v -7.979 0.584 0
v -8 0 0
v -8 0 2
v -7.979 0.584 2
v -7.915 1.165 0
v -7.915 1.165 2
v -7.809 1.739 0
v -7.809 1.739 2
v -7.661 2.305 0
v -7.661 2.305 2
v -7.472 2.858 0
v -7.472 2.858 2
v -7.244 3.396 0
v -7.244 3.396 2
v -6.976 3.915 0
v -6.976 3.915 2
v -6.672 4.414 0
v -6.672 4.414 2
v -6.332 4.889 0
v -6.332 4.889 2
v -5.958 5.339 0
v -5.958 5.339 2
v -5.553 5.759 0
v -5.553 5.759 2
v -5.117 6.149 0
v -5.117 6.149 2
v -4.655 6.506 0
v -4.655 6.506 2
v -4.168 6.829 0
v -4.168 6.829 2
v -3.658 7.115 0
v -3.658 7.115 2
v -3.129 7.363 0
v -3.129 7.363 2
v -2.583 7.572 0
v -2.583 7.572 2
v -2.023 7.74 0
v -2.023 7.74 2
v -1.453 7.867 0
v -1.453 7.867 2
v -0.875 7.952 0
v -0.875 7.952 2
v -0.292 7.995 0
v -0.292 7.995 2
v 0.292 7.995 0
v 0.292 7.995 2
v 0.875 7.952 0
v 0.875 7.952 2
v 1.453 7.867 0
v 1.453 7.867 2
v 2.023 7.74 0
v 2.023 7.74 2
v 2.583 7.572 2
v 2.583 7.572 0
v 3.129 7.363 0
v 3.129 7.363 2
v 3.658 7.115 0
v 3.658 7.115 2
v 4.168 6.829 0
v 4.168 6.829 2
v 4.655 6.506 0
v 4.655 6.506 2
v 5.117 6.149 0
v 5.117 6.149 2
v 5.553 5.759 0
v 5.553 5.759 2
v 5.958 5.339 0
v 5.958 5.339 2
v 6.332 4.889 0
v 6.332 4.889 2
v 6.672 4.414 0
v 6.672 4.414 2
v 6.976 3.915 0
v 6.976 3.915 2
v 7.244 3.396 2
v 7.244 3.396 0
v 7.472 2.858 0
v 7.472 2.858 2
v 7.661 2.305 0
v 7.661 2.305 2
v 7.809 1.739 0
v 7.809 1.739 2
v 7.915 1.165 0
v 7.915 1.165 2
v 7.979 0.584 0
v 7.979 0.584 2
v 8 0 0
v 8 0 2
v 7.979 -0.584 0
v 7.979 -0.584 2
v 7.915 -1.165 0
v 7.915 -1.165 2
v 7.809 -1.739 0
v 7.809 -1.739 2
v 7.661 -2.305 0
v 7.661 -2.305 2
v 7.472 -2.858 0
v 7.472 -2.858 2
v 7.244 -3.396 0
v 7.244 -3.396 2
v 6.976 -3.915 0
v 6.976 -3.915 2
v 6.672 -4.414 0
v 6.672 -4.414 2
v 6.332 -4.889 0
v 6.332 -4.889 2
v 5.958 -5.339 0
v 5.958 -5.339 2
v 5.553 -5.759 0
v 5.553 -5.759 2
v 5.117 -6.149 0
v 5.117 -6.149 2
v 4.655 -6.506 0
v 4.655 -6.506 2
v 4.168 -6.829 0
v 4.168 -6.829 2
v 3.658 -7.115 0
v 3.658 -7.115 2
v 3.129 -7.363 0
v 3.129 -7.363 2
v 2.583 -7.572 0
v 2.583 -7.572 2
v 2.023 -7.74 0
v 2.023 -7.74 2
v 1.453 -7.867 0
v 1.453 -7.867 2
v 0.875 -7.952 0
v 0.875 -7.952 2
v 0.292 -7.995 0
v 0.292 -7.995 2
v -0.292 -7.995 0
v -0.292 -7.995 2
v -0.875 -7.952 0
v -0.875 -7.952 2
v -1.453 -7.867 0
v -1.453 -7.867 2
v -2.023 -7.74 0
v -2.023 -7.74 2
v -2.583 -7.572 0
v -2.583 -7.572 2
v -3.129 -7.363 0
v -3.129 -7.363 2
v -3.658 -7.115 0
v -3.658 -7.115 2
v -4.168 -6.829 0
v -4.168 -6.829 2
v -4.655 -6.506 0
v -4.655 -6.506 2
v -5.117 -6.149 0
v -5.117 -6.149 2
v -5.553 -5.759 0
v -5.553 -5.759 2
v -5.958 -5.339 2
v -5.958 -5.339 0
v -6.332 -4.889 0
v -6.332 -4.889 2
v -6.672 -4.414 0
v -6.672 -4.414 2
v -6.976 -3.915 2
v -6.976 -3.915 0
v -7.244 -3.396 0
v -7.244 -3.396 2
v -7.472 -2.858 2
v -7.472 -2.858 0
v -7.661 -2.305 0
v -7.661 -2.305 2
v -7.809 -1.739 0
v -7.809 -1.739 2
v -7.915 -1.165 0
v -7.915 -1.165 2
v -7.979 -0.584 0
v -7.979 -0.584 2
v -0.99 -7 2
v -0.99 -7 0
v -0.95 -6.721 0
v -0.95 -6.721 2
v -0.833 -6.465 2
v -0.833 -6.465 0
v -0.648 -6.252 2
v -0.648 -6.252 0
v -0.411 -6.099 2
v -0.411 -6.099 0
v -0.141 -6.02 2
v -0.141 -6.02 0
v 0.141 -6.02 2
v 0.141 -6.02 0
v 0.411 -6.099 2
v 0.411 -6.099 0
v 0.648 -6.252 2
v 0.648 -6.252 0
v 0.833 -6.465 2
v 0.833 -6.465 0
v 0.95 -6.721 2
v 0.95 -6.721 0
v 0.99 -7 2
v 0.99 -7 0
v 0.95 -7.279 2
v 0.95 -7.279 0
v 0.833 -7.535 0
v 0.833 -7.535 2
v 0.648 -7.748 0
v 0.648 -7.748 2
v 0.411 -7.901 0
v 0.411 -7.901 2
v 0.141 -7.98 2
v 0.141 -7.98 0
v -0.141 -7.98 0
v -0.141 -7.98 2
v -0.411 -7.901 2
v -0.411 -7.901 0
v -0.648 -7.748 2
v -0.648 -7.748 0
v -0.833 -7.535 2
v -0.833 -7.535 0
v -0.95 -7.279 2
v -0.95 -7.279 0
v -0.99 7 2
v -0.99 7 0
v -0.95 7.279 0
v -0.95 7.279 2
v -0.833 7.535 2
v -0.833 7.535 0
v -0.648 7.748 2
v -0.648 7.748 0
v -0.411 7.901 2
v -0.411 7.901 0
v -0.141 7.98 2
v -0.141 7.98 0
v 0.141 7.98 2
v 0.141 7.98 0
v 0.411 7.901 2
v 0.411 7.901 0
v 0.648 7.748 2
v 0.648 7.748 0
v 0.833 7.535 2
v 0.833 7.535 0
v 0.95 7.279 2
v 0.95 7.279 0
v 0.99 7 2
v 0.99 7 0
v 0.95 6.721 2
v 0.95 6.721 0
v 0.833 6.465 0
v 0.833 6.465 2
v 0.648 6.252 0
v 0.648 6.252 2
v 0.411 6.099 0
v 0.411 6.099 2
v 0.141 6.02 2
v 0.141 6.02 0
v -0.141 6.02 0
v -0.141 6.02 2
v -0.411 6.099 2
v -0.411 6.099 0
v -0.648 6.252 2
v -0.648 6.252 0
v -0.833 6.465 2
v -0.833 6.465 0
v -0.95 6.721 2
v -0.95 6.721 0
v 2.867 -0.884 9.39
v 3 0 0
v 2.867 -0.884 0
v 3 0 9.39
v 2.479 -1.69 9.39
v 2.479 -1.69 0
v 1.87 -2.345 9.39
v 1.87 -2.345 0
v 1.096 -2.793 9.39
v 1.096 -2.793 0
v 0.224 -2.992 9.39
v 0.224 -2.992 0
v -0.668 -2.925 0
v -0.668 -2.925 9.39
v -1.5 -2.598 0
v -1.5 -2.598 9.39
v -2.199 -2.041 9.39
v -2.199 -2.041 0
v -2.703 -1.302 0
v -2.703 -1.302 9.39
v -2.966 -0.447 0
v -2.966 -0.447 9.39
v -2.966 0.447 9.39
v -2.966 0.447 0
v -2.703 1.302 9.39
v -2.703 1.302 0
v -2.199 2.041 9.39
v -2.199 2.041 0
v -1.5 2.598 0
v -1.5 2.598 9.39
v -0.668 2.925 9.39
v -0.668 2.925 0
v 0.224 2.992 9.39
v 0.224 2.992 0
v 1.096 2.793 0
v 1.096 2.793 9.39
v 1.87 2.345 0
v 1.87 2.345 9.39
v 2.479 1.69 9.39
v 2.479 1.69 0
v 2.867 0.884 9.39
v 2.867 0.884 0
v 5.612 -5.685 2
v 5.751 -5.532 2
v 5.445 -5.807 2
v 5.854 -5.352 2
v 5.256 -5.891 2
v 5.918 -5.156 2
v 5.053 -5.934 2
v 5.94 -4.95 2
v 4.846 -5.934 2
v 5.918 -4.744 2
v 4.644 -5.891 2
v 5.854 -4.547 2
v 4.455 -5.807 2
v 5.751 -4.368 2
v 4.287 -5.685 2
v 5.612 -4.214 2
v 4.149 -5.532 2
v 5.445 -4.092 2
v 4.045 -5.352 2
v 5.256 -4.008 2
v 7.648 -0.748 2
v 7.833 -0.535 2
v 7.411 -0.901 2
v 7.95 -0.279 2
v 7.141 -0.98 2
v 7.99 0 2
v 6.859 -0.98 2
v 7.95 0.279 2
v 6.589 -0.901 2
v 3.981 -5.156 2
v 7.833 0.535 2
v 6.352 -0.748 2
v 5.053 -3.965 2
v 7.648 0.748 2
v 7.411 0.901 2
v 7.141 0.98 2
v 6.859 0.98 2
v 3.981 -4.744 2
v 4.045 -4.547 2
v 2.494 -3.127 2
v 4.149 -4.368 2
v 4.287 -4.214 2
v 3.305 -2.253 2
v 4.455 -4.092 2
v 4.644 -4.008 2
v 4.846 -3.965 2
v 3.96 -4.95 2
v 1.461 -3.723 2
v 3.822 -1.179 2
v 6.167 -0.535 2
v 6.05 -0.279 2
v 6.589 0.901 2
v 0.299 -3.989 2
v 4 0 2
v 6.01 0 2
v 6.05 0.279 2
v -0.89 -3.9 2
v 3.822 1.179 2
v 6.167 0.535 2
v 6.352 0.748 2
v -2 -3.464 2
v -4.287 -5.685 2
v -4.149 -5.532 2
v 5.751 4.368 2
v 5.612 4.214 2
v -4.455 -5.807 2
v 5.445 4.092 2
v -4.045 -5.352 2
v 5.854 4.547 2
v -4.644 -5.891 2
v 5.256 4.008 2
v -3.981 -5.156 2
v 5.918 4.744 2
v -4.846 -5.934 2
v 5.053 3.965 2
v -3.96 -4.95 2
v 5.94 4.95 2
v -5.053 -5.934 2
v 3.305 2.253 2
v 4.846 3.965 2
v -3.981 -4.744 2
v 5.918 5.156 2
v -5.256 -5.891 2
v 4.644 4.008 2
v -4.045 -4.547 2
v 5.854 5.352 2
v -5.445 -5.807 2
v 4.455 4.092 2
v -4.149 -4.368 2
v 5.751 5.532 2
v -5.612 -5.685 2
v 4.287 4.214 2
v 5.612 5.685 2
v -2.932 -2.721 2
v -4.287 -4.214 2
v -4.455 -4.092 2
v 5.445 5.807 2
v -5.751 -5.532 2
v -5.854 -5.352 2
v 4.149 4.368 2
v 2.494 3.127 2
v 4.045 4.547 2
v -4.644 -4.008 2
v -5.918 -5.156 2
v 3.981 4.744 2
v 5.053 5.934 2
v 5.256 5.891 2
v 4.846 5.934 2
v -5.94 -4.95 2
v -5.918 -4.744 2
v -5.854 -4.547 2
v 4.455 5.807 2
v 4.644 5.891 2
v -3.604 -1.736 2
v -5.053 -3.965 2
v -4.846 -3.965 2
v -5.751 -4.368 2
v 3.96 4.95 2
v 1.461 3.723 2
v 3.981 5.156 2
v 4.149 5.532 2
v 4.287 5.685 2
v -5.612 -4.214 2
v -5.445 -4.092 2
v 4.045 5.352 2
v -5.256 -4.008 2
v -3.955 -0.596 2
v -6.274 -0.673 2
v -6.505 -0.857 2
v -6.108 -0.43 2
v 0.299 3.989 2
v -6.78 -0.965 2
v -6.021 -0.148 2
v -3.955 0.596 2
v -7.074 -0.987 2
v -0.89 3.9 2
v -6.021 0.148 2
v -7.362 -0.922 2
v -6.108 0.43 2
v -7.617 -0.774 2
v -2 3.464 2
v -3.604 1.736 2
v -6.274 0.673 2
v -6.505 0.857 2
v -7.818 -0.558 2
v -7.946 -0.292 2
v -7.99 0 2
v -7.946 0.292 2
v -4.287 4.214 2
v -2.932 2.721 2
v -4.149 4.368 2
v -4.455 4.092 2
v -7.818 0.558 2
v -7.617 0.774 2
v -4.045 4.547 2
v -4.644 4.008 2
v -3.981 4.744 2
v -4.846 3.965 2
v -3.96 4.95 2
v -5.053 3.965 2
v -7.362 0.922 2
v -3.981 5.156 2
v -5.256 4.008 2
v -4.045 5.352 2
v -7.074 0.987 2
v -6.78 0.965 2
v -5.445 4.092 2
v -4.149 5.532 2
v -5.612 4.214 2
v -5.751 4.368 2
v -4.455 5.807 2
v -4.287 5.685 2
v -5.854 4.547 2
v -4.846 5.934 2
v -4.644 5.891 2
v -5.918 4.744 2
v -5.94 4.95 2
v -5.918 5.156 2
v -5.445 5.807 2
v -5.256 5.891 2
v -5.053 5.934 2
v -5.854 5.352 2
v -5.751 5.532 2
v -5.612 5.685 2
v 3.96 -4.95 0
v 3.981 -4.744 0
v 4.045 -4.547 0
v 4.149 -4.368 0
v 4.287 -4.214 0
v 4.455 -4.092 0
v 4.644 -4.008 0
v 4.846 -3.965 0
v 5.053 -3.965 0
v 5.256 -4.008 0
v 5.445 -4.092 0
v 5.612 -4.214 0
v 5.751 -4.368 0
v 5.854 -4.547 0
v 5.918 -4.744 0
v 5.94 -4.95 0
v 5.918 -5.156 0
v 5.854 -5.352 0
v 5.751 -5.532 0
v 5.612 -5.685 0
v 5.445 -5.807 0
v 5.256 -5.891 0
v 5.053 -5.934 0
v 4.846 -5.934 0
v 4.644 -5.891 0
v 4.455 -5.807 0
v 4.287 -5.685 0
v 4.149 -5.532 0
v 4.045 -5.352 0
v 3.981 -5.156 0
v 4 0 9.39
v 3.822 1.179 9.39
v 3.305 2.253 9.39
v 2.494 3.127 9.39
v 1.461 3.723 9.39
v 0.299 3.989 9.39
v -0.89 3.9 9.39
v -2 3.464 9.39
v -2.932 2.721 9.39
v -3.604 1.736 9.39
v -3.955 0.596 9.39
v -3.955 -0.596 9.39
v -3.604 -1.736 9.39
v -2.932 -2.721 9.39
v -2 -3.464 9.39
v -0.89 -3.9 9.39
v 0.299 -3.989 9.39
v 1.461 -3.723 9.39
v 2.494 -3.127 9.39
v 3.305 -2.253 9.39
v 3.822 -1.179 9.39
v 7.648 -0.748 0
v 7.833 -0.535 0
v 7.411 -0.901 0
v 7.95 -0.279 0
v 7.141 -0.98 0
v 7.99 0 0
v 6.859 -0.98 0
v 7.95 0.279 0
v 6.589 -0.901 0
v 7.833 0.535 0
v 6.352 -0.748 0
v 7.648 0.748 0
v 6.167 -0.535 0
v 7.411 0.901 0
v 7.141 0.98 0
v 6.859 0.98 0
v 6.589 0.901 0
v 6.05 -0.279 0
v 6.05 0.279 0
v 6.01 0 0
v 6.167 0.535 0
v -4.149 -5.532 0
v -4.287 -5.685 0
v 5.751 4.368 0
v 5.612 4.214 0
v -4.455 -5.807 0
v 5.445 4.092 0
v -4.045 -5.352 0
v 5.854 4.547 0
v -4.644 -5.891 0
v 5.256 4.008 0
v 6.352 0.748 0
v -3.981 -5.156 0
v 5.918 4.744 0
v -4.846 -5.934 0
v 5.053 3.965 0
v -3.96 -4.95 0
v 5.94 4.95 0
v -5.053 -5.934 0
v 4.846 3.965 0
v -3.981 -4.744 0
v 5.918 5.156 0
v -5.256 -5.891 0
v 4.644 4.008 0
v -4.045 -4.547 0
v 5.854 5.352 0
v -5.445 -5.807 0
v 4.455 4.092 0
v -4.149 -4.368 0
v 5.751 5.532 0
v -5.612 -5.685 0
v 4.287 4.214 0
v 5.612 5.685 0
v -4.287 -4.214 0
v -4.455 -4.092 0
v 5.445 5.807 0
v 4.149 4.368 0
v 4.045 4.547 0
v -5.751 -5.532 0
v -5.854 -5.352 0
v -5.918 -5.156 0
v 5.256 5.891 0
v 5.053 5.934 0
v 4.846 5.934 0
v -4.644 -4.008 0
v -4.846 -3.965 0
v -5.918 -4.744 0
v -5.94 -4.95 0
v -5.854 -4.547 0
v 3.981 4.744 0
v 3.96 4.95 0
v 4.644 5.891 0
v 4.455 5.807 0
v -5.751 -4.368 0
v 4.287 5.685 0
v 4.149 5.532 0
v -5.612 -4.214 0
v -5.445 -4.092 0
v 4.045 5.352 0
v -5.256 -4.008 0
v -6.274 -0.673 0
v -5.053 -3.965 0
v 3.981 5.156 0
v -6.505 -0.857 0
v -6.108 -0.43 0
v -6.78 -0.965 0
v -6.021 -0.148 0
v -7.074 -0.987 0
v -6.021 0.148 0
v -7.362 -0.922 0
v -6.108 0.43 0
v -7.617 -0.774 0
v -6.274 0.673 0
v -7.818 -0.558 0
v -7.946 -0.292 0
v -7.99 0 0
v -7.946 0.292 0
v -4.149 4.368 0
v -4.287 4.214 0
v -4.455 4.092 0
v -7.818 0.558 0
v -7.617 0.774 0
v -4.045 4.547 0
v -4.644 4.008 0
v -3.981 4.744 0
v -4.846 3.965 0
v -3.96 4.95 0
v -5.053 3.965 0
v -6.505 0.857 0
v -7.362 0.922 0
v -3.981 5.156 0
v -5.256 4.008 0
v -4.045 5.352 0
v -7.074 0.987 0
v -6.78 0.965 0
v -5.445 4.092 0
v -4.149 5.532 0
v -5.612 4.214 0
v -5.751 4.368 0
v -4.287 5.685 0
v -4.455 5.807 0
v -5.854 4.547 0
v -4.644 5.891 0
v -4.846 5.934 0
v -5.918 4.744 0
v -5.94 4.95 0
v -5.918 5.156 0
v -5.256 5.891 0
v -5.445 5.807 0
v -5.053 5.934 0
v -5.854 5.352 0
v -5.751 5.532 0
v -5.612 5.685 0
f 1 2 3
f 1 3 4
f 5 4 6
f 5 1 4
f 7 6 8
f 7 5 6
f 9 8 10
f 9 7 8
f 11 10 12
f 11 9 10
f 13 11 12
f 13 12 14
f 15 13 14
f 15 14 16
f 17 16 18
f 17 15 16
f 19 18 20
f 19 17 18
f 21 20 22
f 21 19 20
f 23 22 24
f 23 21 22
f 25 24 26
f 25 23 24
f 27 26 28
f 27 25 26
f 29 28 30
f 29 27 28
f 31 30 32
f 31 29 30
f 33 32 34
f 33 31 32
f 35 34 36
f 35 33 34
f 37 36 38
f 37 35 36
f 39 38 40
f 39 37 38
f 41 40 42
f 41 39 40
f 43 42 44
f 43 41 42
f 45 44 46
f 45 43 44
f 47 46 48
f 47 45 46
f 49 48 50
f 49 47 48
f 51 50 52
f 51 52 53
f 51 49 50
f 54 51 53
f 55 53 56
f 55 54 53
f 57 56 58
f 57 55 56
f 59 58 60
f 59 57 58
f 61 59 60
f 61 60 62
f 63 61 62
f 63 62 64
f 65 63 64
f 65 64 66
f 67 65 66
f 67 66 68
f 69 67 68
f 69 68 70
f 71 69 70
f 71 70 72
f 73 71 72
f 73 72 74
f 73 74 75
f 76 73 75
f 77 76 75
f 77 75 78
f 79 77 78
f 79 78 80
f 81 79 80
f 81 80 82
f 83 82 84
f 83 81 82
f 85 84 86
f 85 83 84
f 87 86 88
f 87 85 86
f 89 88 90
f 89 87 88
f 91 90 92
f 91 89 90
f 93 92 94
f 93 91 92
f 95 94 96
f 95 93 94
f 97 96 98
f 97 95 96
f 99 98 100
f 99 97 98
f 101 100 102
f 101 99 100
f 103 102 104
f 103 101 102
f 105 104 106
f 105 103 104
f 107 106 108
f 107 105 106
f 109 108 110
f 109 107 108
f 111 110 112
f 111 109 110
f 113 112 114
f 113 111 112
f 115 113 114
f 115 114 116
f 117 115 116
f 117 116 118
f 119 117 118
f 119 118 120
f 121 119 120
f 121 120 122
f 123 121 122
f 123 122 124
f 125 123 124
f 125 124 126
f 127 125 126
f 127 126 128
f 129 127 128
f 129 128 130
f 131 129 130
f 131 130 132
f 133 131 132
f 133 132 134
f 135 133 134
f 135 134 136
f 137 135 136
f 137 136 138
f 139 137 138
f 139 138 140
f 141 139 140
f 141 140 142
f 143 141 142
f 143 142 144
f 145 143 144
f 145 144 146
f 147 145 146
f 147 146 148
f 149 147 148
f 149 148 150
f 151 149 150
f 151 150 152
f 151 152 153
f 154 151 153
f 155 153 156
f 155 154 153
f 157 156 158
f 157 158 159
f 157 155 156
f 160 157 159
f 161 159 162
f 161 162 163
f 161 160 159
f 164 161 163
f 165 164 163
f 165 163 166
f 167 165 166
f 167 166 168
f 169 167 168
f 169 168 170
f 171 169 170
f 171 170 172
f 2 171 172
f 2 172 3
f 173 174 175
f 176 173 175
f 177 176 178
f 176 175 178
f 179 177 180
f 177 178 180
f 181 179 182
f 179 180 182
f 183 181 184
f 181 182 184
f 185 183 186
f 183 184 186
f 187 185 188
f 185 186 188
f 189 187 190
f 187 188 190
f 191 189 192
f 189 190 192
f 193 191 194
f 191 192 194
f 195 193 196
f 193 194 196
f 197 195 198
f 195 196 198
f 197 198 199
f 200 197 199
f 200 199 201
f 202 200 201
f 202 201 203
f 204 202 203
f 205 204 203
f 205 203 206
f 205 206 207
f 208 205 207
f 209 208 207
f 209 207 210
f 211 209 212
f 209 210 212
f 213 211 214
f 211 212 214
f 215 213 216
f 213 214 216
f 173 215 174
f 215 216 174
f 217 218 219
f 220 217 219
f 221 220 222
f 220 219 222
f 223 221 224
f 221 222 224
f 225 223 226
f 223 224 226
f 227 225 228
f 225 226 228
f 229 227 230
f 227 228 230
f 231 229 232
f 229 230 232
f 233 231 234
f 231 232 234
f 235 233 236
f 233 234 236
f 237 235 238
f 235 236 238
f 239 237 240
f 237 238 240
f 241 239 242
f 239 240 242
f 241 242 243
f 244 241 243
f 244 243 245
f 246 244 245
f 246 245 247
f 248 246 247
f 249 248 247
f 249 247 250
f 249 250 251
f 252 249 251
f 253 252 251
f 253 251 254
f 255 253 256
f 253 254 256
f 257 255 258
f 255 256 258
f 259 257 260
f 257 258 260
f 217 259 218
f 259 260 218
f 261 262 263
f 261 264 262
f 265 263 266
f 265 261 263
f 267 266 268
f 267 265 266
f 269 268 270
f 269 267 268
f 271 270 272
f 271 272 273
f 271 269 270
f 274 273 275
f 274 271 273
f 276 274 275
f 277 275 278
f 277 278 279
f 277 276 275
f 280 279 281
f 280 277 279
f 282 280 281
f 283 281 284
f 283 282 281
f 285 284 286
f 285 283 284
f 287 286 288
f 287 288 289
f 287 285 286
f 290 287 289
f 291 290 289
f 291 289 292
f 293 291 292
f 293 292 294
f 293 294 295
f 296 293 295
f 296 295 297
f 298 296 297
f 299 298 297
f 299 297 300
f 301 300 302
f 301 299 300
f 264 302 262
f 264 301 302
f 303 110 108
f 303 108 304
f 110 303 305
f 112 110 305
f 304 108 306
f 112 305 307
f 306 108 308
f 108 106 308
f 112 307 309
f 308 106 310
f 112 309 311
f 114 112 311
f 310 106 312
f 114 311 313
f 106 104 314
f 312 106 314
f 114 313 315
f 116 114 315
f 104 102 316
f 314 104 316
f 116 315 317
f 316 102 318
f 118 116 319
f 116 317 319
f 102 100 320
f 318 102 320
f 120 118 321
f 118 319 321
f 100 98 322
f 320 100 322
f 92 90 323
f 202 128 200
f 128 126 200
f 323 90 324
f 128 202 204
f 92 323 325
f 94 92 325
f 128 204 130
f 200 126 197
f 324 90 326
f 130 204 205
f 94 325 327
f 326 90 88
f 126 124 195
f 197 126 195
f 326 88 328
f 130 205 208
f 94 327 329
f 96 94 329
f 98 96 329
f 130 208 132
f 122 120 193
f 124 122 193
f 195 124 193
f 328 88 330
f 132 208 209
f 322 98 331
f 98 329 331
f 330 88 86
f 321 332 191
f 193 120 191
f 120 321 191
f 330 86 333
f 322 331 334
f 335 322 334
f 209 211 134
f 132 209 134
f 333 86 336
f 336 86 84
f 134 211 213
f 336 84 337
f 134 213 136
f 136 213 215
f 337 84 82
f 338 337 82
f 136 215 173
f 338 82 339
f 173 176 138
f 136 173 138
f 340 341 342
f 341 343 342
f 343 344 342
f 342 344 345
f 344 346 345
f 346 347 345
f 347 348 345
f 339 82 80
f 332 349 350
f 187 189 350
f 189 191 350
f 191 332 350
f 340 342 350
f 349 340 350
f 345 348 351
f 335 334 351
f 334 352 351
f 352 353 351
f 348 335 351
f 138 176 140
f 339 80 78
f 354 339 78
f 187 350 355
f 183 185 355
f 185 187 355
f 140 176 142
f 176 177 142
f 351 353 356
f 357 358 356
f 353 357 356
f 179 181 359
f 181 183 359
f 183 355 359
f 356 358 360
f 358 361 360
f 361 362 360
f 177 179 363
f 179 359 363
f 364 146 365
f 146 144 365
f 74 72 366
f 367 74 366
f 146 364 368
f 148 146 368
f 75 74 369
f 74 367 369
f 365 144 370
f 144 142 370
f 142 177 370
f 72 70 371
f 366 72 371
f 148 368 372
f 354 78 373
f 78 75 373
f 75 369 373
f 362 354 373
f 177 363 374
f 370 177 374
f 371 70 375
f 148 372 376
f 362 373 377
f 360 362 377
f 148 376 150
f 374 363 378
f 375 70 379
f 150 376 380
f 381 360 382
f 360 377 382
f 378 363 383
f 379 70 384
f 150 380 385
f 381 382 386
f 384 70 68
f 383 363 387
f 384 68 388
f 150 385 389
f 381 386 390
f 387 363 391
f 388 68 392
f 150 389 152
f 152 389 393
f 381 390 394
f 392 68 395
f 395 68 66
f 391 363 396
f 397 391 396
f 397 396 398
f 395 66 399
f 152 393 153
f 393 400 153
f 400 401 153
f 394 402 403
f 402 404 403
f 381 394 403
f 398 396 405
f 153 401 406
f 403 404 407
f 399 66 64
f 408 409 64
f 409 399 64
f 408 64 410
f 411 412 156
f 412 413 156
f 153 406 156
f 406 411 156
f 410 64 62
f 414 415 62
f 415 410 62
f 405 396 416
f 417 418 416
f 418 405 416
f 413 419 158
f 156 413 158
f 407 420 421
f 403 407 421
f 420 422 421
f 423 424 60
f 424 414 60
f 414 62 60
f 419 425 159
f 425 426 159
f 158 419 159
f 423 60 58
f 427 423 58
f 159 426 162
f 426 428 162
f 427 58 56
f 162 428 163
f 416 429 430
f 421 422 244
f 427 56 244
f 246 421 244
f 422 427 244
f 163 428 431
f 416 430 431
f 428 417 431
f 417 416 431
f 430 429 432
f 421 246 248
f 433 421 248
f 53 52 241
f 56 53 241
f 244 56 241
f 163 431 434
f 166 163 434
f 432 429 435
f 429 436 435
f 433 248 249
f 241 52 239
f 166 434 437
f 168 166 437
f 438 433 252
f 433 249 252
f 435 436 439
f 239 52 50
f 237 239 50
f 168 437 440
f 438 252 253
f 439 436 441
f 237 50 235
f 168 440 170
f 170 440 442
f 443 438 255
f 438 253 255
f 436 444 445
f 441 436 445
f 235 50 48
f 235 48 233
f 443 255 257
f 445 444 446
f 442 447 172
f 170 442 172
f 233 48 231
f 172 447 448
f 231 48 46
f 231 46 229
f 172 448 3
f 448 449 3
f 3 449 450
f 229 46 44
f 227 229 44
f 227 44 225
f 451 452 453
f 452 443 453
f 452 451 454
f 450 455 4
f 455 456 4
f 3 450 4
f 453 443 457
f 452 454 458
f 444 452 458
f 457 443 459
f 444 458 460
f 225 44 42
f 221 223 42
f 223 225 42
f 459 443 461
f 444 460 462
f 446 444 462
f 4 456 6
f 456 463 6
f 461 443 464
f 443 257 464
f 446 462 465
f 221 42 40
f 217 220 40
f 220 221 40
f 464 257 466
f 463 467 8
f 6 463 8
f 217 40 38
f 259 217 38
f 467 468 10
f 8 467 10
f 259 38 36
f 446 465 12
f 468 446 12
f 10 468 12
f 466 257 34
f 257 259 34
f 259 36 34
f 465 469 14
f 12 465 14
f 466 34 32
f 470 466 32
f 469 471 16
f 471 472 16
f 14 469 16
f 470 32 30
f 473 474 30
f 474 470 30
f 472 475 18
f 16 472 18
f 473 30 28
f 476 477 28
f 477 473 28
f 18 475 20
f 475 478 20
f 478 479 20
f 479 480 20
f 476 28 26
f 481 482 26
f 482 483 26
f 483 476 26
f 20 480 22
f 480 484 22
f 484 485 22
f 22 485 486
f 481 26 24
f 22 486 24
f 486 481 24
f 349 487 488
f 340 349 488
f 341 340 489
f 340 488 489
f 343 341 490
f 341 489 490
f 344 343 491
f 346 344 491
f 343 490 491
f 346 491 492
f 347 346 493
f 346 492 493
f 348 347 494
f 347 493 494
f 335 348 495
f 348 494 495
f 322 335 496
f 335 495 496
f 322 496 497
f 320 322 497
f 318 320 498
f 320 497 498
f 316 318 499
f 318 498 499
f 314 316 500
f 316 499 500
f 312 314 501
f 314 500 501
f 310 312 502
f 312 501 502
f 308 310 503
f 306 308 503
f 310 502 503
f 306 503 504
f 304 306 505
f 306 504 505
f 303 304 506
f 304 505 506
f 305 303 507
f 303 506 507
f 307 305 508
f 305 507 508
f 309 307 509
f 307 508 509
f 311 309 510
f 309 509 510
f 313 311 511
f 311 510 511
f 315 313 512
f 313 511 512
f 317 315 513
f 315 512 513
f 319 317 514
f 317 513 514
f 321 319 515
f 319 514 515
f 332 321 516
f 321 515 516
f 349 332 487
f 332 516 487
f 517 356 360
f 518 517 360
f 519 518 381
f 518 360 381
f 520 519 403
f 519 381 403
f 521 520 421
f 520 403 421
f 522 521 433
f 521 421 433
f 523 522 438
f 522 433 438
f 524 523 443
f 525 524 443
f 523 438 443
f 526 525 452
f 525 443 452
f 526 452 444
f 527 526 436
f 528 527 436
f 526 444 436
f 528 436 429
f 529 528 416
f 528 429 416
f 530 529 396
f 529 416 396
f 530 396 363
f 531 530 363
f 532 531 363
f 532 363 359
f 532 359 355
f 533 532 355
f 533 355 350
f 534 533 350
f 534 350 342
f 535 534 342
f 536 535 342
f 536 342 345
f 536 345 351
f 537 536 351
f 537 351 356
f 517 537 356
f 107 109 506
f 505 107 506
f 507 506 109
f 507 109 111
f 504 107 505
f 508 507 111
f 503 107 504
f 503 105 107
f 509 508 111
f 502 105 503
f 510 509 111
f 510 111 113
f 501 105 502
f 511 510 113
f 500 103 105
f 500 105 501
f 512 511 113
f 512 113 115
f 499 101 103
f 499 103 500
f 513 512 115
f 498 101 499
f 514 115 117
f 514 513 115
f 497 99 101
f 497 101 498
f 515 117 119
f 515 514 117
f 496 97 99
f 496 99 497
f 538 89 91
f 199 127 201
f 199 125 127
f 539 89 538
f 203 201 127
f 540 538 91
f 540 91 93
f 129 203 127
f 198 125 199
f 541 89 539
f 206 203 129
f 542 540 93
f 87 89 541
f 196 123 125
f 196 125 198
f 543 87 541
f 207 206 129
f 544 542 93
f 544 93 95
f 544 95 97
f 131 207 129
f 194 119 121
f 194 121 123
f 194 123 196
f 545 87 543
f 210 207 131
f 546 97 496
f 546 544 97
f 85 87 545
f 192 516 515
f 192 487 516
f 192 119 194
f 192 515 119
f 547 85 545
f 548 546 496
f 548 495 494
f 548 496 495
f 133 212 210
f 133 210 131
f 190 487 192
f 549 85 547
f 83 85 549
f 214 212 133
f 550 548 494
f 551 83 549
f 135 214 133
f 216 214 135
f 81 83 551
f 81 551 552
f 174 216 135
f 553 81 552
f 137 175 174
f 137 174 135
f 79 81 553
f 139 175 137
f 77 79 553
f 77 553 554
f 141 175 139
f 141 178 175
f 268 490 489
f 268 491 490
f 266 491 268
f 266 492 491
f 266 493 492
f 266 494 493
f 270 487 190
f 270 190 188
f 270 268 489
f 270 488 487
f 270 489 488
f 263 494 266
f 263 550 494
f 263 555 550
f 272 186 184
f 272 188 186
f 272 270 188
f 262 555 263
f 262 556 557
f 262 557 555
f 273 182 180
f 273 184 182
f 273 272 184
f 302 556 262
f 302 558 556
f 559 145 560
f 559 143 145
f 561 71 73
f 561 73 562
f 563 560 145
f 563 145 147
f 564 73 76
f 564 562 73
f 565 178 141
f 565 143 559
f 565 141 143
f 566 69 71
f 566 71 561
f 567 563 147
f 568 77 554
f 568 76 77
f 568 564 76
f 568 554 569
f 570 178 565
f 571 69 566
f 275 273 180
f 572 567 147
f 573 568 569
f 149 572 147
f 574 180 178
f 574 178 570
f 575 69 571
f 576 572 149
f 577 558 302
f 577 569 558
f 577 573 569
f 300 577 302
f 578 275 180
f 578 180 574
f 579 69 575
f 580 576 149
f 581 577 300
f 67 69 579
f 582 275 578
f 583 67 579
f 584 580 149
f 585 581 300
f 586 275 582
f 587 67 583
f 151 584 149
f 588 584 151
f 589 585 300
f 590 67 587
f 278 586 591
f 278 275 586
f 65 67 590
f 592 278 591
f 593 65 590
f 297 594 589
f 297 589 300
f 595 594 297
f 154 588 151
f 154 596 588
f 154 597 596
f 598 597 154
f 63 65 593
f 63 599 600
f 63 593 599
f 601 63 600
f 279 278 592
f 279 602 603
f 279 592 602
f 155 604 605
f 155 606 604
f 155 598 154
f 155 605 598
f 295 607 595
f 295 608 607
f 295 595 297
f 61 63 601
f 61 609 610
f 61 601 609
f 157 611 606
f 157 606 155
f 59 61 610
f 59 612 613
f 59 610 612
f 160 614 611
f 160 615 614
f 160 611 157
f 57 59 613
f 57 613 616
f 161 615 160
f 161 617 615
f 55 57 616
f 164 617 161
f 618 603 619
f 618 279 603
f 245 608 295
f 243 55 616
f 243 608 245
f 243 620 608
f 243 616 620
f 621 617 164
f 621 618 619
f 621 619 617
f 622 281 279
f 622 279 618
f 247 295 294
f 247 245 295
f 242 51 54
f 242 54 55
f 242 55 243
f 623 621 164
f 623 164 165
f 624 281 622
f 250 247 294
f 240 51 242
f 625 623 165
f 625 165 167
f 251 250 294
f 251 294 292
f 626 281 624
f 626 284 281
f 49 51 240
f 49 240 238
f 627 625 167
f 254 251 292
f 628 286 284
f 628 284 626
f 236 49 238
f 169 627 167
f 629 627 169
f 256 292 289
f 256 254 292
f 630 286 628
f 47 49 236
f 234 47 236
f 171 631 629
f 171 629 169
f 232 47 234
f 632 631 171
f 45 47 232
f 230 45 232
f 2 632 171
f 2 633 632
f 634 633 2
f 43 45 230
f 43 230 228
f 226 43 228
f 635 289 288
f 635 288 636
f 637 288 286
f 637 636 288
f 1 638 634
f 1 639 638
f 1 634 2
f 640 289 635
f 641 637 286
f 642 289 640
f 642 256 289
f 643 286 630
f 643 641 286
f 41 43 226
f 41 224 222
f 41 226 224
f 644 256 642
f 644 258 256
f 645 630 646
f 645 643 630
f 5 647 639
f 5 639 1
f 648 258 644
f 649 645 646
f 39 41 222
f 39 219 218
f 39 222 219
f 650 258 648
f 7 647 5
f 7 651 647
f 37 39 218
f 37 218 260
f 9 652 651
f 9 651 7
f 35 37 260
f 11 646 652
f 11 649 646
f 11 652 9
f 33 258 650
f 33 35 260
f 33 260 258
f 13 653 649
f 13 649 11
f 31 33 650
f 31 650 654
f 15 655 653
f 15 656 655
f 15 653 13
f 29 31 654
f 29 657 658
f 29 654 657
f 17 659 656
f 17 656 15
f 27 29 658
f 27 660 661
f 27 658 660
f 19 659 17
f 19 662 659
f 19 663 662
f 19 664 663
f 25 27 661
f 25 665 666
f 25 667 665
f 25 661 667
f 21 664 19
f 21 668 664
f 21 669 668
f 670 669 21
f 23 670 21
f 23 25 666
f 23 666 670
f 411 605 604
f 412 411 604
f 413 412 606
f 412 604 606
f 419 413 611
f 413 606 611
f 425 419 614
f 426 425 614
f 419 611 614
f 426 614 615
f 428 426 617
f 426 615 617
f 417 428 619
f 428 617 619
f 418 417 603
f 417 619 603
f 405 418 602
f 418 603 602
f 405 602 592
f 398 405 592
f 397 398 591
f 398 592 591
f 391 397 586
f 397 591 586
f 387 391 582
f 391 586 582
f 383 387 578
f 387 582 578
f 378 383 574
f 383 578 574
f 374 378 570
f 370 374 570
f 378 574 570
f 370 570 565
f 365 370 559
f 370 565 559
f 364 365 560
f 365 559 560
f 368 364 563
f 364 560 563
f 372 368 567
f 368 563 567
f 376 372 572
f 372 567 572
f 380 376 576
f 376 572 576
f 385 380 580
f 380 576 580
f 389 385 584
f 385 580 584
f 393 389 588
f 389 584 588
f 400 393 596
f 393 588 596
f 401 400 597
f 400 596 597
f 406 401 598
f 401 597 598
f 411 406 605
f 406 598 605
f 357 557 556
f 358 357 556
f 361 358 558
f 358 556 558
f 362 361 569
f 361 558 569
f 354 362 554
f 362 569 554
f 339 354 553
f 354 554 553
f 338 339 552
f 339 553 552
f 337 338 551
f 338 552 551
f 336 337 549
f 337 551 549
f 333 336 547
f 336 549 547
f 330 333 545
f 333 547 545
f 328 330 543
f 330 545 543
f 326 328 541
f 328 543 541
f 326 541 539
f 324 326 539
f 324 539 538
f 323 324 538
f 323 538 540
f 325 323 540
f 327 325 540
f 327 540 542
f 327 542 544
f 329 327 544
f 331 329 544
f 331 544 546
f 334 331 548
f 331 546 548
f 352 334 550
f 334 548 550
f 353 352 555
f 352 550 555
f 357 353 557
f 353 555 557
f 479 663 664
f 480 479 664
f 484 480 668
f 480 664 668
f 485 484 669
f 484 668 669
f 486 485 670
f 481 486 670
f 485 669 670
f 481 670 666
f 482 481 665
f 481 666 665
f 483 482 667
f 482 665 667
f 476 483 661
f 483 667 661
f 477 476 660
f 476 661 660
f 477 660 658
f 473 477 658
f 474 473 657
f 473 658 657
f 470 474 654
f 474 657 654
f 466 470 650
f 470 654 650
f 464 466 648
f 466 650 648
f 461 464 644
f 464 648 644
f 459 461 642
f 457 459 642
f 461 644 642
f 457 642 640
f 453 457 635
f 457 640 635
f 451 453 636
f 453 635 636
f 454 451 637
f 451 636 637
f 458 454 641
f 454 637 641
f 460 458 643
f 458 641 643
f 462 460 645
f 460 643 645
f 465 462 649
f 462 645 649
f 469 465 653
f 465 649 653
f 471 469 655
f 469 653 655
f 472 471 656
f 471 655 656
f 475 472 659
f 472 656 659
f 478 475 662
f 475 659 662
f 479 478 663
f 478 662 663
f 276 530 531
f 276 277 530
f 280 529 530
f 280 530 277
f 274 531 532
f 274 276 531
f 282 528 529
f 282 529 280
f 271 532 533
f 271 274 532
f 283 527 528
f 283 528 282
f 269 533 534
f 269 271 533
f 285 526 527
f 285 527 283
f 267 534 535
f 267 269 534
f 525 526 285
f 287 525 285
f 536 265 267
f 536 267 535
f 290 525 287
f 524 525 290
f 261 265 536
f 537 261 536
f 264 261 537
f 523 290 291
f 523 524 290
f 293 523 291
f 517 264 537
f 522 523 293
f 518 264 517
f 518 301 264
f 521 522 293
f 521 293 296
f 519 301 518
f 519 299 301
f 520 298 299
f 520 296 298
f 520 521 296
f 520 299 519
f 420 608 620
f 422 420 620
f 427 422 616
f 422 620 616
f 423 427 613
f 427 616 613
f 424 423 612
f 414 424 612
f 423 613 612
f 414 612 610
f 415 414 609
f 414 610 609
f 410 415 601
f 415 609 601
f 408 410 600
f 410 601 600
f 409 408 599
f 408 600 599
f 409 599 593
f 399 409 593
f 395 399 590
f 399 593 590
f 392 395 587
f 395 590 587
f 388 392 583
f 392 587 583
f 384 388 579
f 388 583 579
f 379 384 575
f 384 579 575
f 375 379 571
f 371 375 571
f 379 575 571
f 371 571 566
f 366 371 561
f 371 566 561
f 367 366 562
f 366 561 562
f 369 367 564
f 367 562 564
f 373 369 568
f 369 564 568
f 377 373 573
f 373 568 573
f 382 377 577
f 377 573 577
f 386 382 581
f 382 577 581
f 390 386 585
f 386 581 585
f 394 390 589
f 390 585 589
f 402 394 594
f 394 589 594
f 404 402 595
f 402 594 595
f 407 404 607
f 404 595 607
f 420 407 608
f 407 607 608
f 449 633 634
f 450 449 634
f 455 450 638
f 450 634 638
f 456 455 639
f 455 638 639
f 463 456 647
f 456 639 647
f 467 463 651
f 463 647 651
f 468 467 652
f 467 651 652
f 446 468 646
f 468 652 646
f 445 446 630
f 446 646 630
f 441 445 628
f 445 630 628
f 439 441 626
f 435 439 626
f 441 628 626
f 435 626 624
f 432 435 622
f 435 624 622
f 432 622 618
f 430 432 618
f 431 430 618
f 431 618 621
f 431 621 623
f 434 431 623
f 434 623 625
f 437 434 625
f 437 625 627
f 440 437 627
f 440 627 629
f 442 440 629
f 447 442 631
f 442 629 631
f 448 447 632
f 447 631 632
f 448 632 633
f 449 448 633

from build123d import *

# Parameters (mm, degrees)
SKETCH_1_R          = 4
EXTRUDE_1_DEPTH     = 9.39
SKETCH_2_R          = 3
CUT_EXTRUDE_1_DEPTH = 8
CUT_EXTRUDE_START   = -8
SKETCH_3_R          = 3
CUT_EXTRUDE_3_DEPTH = 8
SKETCH_4_R          = 8
SKETCH_4_R_2        = 4
EXTRUDE_4_DEPTH     = 2
SKETCH_5_R          = 0.99
CUT_EXTRUDE_6_DEPTH = 2


with BuildPart() as part:
    # 草图1 → 凸台-拉伸1 (new body)
    with BuildSketch(Plane.XY):
        Circle(SKETCH_1_R)
    extrude(amount=EXTRUDE_1_DEPTH)

    # 草图2 → 切除-拉伸1 (cut)
    with BuildSketch(Plane.XY.offset(9.39)):
        Circle(SKETCH_2_R)
    extrude(amount=-CUT_EXTRUDE_1_DEPTH, mode=Mode.SUBTRACT)

    # 草图3 → 切除-拉伸3 (cut)
    with BuildSketch(Plane(origin=(0, 0, 0), x_dir=(-1, 0, 0), z_dir=(0, 0, -1)).offset(CUT_EXTRUDE_START)):
        with Locations(Location((0, 0, 0), (0, 0, 180))):
            Circle(SKETCH_3_R)
    extrude(amount=CUT_EXTRUDE_3_DEPTH, mode=Mode.SUBTRACT)

    # 草图4 → 凸台-拉伸4 (add)
    with BuildSketch(Plane(origin=(0, 0, 0), x_dir=(-1, 0, 0), z_dir=(0, 0, -1))):
        Circle(SKETCH_4_R)
        Circle(SKETCH_4_R_2, mode=Mode.SUBTRACT)
    extrude(amount=-EXTRUDE_4_DEPTH)

    # 草图5 → 切除-拉伸6 (cut)
    with BuildSketch(Plane(origin=(0, 0, 0), x_dir=(-1, 0, 0), z_dir=(0, 0, -1))):
        with Locations((7, 0)):
            Circle(SKETCH_5_R)
        with Locations((4.949747468, -4.949747468)):
            Circle(SKETCH_5_R)
        with Locations((0, -7)):
            Circle(SKETCH_5_R)
        with Locations((-4.949747468, -4.949747468)):
            Circle(SKETCH_5_R)
        with Locations((-7, 0)):
            Circle(SKETCH_5_R)
        with Locations((-4.949747468, 4.949747468)):
            Circle(SKETCH_5_R)
        with Locations((0, 7)):
            Circle(SKETCH_5_R)
        with Locations((4.949747468, 4.949747468)):
            Circle(SKETCH_5_R)
    extrude(amount=-CUT_EXTRUDE_6_DEPTH, mode=Mode.SUBTRACT)


solid = part.part
